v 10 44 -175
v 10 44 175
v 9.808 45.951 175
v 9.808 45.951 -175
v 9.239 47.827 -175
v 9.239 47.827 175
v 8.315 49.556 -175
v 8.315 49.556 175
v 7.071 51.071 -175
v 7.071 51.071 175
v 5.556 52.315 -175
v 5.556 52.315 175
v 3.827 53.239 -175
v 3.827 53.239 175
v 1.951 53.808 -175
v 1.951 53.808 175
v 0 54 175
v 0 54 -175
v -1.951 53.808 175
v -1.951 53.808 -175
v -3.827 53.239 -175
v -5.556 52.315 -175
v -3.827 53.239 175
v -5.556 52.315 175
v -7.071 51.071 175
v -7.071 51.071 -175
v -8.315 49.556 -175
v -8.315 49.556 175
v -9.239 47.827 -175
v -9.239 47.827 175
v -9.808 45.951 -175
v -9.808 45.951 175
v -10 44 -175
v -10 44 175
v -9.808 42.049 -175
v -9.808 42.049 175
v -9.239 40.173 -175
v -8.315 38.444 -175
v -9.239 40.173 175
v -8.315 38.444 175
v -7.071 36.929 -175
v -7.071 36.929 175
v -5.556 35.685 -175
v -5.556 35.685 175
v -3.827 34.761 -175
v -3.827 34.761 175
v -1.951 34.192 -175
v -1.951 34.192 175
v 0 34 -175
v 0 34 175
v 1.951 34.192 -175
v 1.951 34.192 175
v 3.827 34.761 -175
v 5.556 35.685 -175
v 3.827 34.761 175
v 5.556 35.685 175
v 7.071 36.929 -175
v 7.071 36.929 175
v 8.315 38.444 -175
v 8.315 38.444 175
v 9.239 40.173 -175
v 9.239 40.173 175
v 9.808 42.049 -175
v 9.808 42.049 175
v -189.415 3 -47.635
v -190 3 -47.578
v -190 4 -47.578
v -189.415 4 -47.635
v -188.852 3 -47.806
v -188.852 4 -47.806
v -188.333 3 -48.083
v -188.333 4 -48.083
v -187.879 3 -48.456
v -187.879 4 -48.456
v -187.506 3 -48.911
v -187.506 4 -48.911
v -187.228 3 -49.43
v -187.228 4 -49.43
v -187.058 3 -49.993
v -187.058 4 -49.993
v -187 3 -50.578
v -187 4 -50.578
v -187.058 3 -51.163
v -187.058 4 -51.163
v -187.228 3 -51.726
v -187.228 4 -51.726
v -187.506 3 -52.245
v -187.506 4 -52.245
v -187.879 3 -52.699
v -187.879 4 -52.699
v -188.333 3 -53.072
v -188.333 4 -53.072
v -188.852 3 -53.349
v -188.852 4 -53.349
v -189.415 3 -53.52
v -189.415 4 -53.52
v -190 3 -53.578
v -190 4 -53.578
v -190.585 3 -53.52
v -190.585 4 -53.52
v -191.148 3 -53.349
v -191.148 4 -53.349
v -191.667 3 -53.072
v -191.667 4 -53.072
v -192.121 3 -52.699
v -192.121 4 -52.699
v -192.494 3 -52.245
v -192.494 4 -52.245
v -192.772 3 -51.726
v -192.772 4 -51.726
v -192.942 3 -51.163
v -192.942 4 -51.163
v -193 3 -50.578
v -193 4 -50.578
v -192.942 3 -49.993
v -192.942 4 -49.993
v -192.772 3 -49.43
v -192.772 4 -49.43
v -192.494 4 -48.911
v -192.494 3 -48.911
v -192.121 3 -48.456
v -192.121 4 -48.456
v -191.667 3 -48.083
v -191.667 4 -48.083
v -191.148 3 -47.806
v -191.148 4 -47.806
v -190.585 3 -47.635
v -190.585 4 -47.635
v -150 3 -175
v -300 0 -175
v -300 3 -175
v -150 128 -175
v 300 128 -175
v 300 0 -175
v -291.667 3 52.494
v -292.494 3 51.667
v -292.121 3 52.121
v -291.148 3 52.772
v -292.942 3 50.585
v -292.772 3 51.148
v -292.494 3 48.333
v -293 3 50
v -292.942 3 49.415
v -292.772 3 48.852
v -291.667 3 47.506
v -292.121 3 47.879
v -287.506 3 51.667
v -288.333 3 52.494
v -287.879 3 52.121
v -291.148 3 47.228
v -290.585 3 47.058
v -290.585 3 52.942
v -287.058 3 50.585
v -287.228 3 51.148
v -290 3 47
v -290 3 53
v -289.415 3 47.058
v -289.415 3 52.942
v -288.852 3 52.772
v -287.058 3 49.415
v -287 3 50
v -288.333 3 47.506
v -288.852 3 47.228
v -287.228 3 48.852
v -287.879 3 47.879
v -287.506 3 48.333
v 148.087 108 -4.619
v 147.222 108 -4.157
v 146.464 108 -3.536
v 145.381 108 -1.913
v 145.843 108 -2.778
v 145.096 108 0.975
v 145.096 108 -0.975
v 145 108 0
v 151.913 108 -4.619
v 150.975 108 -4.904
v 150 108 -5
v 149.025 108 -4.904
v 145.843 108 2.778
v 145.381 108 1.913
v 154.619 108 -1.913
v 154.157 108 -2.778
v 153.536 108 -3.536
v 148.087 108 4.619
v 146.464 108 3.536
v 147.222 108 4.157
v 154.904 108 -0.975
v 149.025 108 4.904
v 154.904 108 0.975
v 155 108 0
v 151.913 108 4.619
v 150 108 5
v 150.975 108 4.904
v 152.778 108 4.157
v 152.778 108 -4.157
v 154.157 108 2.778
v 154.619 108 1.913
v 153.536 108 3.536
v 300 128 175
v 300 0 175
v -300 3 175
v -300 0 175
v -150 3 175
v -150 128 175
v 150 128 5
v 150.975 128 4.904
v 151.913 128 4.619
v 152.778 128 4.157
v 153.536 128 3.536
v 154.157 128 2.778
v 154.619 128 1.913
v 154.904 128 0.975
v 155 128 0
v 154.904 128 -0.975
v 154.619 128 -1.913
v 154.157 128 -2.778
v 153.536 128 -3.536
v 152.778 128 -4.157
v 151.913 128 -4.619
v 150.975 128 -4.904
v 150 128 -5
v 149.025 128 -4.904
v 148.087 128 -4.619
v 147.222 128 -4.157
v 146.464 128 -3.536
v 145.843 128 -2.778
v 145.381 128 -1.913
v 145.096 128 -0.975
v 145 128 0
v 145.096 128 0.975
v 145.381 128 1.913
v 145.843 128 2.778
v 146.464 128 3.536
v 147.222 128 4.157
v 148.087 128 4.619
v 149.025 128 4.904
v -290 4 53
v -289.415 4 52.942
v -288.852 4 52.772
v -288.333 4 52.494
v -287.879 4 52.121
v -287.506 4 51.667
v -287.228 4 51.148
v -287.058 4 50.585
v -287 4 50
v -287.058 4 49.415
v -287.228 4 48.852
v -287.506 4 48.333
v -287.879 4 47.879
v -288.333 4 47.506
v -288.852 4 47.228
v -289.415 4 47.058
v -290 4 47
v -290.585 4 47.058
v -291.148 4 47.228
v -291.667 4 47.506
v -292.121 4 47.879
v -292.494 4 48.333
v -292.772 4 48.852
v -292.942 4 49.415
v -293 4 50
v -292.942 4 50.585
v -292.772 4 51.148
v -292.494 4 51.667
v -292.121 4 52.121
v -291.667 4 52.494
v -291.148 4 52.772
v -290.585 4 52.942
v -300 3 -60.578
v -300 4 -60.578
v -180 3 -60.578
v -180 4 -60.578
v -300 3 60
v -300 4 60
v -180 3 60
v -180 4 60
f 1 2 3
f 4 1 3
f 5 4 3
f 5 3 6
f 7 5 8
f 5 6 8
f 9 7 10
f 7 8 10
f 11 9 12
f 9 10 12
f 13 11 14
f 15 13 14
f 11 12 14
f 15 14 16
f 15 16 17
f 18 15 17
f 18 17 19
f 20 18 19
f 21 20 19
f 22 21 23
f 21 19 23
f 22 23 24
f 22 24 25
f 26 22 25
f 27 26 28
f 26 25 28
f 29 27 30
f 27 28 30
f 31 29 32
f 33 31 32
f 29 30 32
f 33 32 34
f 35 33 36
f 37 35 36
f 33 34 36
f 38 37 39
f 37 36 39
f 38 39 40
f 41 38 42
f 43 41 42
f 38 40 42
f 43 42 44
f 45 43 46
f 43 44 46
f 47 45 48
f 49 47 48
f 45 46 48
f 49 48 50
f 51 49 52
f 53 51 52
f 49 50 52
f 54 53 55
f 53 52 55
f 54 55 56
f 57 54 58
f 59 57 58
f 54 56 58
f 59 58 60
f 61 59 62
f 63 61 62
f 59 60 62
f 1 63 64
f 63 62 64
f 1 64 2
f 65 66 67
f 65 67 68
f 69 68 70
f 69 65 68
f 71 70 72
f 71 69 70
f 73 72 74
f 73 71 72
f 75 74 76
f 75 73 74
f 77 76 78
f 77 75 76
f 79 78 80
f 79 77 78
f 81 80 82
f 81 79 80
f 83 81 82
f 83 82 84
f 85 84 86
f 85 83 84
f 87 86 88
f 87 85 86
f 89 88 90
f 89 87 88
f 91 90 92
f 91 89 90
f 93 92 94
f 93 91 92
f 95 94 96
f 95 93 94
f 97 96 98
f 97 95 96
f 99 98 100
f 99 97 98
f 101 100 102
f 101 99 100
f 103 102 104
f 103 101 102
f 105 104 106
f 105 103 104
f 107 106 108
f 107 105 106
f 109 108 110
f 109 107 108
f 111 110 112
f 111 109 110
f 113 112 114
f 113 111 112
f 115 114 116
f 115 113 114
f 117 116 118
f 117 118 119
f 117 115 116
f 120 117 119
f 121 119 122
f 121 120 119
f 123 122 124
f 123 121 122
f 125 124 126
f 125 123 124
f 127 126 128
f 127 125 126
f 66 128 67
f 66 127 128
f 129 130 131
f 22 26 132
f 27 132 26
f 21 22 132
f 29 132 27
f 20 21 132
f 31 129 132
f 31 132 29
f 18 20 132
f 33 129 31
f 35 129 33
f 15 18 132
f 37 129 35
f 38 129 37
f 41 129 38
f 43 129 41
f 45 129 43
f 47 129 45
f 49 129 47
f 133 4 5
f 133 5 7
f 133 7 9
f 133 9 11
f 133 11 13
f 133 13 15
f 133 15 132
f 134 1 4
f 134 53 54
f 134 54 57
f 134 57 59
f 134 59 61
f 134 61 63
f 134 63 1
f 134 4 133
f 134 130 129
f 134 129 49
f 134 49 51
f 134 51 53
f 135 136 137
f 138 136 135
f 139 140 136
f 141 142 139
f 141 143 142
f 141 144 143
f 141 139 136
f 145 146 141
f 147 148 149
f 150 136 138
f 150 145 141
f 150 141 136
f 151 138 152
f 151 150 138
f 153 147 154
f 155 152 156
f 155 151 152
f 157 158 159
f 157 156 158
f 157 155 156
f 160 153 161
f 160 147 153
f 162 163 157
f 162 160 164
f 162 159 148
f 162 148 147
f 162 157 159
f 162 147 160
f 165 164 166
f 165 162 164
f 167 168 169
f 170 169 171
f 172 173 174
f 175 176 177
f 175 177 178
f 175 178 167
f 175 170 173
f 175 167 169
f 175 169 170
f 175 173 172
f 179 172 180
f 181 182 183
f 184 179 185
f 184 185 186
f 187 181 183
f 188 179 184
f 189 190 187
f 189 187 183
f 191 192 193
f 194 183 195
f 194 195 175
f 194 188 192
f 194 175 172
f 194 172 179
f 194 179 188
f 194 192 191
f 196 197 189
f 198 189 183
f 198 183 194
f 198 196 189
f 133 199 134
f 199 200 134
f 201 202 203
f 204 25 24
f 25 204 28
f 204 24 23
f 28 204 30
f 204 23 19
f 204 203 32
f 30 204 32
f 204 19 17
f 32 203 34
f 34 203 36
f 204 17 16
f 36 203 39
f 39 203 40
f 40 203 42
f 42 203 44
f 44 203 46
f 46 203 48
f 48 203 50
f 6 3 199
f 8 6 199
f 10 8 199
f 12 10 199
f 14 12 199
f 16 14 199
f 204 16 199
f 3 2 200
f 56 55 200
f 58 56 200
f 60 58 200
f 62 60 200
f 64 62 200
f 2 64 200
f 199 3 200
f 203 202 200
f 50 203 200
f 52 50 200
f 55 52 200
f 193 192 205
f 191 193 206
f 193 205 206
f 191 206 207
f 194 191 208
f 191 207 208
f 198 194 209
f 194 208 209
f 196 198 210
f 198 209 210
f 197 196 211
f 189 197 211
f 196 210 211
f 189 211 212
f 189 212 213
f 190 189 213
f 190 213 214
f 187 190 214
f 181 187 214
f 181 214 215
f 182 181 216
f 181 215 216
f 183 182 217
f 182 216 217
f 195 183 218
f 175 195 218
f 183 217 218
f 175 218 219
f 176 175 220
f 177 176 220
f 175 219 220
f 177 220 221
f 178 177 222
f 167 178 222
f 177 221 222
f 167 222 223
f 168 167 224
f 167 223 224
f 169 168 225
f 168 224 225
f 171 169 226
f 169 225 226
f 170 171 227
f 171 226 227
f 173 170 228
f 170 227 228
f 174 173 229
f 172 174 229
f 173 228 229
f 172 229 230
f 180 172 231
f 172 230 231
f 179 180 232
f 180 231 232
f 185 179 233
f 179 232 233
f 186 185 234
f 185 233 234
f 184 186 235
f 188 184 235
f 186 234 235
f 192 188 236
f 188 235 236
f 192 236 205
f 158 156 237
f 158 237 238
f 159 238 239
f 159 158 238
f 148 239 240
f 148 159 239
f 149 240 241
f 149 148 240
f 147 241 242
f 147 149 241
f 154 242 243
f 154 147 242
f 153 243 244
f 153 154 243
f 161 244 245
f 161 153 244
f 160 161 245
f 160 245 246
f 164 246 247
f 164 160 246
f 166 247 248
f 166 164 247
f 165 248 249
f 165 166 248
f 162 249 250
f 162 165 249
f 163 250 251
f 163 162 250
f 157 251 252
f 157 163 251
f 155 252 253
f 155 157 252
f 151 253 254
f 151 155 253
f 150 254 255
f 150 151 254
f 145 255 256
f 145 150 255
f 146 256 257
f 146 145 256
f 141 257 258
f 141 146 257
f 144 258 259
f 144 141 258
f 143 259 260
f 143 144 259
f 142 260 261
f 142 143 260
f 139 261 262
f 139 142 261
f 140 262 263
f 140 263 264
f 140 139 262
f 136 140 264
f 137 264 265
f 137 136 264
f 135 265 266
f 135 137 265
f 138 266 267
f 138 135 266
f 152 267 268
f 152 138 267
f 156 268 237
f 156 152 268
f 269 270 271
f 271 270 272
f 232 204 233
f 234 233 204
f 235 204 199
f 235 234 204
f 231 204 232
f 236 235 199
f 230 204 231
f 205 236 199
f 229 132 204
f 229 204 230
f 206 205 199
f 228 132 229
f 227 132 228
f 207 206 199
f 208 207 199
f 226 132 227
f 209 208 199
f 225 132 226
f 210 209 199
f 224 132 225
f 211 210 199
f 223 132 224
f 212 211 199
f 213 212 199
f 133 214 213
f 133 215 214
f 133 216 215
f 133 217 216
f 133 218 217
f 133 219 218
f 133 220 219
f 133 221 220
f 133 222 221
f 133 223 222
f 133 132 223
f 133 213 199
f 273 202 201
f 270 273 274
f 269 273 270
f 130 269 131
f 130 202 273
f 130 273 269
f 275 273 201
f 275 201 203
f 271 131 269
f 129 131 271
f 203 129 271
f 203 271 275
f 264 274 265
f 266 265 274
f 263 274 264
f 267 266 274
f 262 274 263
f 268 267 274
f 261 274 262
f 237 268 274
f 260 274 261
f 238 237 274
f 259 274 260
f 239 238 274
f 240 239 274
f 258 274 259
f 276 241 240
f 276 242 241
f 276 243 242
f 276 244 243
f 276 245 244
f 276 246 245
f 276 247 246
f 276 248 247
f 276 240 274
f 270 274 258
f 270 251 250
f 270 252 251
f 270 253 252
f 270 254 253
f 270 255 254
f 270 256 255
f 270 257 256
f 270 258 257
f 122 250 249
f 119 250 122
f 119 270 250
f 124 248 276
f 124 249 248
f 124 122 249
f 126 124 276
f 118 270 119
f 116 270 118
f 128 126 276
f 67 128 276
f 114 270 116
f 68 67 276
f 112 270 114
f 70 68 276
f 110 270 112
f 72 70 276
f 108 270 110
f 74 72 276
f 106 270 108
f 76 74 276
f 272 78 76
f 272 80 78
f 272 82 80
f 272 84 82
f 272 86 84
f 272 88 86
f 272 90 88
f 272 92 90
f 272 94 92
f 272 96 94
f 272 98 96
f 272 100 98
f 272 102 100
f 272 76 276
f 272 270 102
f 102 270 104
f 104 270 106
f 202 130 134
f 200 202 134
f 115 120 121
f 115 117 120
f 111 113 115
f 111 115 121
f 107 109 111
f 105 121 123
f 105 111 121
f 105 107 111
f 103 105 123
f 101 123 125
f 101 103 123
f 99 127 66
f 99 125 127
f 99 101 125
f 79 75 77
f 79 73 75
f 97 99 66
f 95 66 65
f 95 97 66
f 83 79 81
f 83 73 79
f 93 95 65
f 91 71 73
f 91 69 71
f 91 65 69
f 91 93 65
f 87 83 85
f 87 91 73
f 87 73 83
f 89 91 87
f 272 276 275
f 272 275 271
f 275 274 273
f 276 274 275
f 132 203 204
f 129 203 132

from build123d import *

# Parameters (mm, degrees)
SKETCH2_W           = 600
SKETCH2_H           = 350
BOSS_EXTRUDE1_DEPTH = 3
SKETCH3_W           = 450
SKETCH3_H           = 350
BOSS_EXTRUDE2_DEPTH = 125
SKETCH4_R           = 10
CUT_EXTRUDE1_DEPTH  = 350
SKETCH6_R           = 5
CUT_EXTRUDE2_DEPTH  = 20
SKETCH7_W           = 120
SKETCH7_H           = 120.57779395
SKETCH7_R           = 3
BOSS_EXTRUDE3_DEPTH = 1


with BuildPart() as part:
    # Sketch2 → Boss-Extrude1 (new body)
    with BuildSketch(Plane(origin=(0, 0, 0), x_dir=(1, 0, 0), z_dir=(0, 1, 0))):
        Rectangle(SKETCH2_W, SKETCH2_H)
    extrude(amount=BOSS_EXTRUDE1_DEPTH)

    # Sketch3 → Boss-Extrude2 (add)
    with BuildSketch(Plane(origin=(0, 3, 0), x_dir=(1, 0, 0), z_dir=(0, 1, 0))):
        with Locations((75, 0)):
            Rectangle(SKETCH3_W, SKETCH3_H)
    extrude(amount=BOSS_EXTRUDE2_DEPTH)

    # Sketch4 → Cut-Extrude1 (cut)
    with BuildSketch(Plane.XY.offset(175)):
        with Locations((0, 44)):
            Circle(SKETCH4_R)
    extrude(amount=-CUT_EXTRUDE1_DEPTH, mode=Mode.SUBTRACT)

    # Sketch6 → Cut-Extrude2 (cut)
    with BuildSketch(Plane(origin=(0, 128, 0), x_dir=(1, 0, 0), z_dir=(0, 1, 0))):
        with Locations(Location((150, 0, 0), (0, 0, 270))):
            Circle(SKETCH6_R)
    extrude(amount=-CUT_EXTRUDE2_DEPTH, mode=Mode.SUBTRACT)

    # Sketch7 → Boss-Extrude3 (add, symmetric)
    with BuildSketch(Plane(origin=(0, 3, 0), x_dir=(1, 0, 0), z_dir=(0, 1, 0))):
        with Locations((-240, 0.288896975)):
            Rectangle(SKETCH7_W, SKETCH7_H)
        with Locations(Location((-190, 50.57779395, 0), (0, 0, 270))):
            Circle(SKETCH7_R, mode=Mode.SUBTRACT)
        with Locations(Location((-290, -50, 0), (0, 0, 270))):
            Circle(SKETCH7_R, mode=Mode.SUBTRACT)
    extrude(amount=BOSS_EXTRUDE3_DEPTH, both=True)


solid = part.part
